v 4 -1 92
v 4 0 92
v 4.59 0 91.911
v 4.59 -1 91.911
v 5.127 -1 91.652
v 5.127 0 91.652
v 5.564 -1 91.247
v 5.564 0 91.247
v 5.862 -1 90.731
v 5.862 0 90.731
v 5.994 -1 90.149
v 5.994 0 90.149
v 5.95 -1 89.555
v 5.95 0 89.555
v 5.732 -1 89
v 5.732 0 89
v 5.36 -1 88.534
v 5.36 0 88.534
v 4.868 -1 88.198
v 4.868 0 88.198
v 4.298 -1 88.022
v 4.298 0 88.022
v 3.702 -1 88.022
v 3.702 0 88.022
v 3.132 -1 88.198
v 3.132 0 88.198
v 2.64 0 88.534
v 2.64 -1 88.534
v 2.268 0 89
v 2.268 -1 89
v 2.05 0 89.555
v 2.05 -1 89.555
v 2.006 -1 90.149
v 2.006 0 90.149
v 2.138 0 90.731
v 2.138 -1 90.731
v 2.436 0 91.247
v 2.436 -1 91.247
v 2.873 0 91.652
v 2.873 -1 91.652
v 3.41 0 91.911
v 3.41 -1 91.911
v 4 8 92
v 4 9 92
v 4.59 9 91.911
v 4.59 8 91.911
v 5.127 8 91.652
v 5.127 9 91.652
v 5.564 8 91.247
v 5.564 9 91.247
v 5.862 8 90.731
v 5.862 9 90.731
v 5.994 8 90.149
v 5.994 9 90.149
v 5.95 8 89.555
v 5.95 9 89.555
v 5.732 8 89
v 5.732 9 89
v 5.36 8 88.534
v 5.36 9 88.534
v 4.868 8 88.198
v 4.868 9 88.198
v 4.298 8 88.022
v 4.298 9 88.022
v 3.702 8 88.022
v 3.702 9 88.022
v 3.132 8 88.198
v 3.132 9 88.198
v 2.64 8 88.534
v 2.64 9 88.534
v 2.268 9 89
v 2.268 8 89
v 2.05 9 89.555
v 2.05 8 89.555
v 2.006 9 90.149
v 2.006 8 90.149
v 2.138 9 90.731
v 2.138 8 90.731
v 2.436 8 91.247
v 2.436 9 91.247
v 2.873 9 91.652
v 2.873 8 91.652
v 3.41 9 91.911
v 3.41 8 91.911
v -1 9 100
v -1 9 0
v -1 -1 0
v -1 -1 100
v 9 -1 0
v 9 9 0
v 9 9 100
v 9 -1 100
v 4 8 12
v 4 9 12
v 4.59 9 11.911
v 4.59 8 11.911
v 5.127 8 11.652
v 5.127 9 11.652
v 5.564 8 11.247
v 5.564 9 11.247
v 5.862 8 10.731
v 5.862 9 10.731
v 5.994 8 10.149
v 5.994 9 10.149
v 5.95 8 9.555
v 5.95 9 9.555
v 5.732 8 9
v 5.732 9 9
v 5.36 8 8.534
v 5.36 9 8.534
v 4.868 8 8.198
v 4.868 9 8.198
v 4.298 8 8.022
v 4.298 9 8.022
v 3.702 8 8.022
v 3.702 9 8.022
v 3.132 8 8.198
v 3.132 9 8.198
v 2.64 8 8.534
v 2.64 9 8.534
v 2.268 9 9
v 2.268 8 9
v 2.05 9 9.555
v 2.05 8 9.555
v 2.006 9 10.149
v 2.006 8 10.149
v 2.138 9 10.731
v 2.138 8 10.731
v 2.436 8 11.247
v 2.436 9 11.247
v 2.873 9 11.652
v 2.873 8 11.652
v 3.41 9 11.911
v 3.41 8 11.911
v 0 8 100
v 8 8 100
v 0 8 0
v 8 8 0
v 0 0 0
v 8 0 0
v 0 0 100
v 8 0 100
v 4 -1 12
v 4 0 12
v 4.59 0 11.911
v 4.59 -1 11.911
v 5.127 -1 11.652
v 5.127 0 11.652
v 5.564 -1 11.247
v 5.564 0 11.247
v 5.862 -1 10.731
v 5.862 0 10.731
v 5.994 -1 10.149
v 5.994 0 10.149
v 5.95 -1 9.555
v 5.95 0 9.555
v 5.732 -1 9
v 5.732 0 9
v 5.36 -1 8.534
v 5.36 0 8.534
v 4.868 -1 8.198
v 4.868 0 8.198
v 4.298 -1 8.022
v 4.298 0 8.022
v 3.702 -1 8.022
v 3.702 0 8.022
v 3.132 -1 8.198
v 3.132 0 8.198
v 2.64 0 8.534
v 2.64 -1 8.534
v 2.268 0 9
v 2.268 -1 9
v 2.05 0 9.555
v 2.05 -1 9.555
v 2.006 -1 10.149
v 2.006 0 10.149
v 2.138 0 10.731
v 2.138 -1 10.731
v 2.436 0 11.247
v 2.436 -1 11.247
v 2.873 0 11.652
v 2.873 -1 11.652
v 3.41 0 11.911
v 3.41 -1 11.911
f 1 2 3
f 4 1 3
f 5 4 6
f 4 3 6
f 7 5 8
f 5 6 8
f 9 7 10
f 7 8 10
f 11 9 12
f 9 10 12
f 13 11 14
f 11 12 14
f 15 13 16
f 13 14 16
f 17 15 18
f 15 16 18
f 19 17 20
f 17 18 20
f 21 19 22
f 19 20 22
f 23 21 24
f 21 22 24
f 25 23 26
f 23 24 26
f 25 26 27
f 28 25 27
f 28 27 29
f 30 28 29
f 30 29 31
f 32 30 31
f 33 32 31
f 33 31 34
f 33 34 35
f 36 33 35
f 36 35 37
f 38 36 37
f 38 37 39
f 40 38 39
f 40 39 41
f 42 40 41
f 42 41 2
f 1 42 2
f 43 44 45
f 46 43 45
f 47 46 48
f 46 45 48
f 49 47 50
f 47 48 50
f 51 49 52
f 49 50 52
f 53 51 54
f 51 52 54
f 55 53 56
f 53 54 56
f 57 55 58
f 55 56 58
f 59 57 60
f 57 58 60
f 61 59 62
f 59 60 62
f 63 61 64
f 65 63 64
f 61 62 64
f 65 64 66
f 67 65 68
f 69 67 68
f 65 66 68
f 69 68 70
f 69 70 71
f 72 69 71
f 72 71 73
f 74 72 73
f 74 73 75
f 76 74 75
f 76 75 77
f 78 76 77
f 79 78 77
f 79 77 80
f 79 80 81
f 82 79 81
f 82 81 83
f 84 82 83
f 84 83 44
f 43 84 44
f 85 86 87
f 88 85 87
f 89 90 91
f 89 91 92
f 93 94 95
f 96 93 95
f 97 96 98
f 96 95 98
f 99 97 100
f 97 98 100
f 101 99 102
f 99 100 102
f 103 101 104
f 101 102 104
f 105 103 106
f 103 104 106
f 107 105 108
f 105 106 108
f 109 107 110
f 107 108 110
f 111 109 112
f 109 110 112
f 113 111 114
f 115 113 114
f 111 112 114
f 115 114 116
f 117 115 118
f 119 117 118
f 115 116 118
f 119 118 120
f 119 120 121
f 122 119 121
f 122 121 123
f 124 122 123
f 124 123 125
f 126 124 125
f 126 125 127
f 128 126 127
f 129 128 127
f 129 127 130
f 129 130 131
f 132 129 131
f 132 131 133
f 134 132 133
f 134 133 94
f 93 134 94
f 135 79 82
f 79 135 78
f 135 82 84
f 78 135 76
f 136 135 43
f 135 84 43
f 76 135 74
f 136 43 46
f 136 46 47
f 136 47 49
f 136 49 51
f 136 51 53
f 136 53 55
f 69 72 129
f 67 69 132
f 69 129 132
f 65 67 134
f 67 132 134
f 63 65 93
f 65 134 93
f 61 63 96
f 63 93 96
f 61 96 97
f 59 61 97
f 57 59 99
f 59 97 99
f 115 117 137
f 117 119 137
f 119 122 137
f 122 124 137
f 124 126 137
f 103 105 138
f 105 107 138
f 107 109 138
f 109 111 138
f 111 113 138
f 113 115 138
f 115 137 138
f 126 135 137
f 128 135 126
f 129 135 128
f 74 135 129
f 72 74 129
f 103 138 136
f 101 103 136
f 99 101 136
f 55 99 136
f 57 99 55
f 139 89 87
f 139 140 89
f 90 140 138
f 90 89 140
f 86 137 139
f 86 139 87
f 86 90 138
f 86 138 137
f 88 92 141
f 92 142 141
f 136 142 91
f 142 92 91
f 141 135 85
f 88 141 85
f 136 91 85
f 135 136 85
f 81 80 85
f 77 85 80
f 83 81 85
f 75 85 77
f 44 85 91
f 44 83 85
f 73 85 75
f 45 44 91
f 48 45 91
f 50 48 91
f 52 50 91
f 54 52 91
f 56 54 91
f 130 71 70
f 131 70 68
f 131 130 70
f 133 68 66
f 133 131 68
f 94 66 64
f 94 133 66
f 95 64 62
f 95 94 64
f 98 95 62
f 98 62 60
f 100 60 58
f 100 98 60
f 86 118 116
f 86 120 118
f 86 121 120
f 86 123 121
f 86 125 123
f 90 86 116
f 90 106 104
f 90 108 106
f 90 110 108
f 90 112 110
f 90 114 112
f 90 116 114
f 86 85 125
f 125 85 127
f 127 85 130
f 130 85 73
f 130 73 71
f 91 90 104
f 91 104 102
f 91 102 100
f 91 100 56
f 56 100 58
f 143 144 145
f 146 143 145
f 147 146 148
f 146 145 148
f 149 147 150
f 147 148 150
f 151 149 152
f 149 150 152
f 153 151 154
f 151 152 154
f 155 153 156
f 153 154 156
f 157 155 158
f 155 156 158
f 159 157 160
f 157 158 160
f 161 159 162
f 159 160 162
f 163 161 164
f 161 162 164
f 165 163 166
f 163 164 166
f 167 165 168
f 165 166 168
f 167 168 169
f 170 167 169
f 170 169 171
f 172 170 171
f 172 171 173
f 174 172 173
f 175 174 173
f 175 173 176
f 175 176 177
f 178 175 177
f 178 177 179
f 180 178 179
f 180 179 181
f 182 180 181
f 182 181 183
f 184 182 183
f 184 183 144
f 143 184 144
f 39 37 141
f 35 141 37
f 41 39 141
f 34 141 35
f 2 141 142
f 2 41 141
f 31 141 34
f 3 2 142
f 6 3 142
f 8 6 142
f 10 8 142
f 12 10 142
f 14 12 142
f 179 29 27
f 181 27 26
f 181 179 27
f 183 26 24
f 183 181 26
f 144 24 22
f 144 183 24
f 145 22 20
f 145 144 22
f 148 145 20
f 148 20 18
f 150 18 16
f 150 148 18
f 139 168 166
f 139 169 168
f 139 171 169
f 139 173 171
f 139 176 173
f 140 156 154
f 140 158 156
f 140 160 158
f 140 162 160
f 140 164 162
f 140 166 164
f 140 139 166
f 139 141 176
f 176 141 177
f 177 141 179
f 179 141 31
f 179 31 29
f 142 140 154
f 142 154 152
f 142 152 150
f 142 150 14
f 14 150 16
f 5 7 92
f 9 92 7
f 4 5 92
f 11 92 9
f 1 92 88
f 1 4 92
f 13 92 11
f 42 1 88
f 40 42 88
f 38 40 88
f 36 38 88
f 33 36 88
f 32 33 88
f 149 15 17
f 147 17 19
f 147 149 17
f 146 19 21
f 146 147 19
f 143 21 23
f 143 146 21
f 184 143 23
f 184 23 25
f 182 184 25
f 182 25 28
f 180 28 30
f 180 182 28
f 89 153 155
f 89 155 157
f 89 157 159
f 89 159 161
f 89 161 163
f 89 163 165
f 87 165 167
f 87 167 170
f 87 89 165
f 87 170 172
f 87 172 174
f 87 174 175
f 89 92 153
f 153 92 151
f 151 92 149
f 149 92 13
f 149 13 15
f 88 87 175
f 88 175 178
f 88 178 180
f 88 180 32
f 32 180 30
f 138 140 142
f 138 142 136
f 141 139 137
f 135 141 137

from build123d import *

# Parameters (mm, degrees)
SKETCH_1_W          = 8
SKETCH_1_H          = 8
EXTRUDE_1_DEPTH     = 100
SKETCH_2_R          = 2
CUT_EXTRUDE_1_DEPTH = 104


with BuildPart() as part:
    # 草图1 → 凸台-拉伸1 (new body)
    with BuildSketch(Plane.XY):
        Polygon((-1, 5.896797153), (-1, 9), (9, 9), (9, -1), (-1, -1), align=None)
        with Locations((4, 4)):
            Rectangle(SKETCH_1_W, SKETCH_1_H, mode=Mode.SUBTRACT)
    extrude(amount=EXTRUDE_1_DEPTH)

    # 草图2 → 切除-拉伸1 (cut)
    with BuildSketch(Plane(origin=(0, 9, 0), x_dir=(1, 0, 0), z_dir=(0, 1, 0))):
        with Locations(Location((4, -90, 0), (0, 0, 270))):
            Circle(SKETCH_2_R)
        with Locations(Location((4, -10, 0), (0, 0, 270))):
            Circle(SKETCH_2_R)
    extrude(amount=-CUT_EXTRUDE_1_DEPTH, mode=Mode.SUBTRACT)


solid = part.part
